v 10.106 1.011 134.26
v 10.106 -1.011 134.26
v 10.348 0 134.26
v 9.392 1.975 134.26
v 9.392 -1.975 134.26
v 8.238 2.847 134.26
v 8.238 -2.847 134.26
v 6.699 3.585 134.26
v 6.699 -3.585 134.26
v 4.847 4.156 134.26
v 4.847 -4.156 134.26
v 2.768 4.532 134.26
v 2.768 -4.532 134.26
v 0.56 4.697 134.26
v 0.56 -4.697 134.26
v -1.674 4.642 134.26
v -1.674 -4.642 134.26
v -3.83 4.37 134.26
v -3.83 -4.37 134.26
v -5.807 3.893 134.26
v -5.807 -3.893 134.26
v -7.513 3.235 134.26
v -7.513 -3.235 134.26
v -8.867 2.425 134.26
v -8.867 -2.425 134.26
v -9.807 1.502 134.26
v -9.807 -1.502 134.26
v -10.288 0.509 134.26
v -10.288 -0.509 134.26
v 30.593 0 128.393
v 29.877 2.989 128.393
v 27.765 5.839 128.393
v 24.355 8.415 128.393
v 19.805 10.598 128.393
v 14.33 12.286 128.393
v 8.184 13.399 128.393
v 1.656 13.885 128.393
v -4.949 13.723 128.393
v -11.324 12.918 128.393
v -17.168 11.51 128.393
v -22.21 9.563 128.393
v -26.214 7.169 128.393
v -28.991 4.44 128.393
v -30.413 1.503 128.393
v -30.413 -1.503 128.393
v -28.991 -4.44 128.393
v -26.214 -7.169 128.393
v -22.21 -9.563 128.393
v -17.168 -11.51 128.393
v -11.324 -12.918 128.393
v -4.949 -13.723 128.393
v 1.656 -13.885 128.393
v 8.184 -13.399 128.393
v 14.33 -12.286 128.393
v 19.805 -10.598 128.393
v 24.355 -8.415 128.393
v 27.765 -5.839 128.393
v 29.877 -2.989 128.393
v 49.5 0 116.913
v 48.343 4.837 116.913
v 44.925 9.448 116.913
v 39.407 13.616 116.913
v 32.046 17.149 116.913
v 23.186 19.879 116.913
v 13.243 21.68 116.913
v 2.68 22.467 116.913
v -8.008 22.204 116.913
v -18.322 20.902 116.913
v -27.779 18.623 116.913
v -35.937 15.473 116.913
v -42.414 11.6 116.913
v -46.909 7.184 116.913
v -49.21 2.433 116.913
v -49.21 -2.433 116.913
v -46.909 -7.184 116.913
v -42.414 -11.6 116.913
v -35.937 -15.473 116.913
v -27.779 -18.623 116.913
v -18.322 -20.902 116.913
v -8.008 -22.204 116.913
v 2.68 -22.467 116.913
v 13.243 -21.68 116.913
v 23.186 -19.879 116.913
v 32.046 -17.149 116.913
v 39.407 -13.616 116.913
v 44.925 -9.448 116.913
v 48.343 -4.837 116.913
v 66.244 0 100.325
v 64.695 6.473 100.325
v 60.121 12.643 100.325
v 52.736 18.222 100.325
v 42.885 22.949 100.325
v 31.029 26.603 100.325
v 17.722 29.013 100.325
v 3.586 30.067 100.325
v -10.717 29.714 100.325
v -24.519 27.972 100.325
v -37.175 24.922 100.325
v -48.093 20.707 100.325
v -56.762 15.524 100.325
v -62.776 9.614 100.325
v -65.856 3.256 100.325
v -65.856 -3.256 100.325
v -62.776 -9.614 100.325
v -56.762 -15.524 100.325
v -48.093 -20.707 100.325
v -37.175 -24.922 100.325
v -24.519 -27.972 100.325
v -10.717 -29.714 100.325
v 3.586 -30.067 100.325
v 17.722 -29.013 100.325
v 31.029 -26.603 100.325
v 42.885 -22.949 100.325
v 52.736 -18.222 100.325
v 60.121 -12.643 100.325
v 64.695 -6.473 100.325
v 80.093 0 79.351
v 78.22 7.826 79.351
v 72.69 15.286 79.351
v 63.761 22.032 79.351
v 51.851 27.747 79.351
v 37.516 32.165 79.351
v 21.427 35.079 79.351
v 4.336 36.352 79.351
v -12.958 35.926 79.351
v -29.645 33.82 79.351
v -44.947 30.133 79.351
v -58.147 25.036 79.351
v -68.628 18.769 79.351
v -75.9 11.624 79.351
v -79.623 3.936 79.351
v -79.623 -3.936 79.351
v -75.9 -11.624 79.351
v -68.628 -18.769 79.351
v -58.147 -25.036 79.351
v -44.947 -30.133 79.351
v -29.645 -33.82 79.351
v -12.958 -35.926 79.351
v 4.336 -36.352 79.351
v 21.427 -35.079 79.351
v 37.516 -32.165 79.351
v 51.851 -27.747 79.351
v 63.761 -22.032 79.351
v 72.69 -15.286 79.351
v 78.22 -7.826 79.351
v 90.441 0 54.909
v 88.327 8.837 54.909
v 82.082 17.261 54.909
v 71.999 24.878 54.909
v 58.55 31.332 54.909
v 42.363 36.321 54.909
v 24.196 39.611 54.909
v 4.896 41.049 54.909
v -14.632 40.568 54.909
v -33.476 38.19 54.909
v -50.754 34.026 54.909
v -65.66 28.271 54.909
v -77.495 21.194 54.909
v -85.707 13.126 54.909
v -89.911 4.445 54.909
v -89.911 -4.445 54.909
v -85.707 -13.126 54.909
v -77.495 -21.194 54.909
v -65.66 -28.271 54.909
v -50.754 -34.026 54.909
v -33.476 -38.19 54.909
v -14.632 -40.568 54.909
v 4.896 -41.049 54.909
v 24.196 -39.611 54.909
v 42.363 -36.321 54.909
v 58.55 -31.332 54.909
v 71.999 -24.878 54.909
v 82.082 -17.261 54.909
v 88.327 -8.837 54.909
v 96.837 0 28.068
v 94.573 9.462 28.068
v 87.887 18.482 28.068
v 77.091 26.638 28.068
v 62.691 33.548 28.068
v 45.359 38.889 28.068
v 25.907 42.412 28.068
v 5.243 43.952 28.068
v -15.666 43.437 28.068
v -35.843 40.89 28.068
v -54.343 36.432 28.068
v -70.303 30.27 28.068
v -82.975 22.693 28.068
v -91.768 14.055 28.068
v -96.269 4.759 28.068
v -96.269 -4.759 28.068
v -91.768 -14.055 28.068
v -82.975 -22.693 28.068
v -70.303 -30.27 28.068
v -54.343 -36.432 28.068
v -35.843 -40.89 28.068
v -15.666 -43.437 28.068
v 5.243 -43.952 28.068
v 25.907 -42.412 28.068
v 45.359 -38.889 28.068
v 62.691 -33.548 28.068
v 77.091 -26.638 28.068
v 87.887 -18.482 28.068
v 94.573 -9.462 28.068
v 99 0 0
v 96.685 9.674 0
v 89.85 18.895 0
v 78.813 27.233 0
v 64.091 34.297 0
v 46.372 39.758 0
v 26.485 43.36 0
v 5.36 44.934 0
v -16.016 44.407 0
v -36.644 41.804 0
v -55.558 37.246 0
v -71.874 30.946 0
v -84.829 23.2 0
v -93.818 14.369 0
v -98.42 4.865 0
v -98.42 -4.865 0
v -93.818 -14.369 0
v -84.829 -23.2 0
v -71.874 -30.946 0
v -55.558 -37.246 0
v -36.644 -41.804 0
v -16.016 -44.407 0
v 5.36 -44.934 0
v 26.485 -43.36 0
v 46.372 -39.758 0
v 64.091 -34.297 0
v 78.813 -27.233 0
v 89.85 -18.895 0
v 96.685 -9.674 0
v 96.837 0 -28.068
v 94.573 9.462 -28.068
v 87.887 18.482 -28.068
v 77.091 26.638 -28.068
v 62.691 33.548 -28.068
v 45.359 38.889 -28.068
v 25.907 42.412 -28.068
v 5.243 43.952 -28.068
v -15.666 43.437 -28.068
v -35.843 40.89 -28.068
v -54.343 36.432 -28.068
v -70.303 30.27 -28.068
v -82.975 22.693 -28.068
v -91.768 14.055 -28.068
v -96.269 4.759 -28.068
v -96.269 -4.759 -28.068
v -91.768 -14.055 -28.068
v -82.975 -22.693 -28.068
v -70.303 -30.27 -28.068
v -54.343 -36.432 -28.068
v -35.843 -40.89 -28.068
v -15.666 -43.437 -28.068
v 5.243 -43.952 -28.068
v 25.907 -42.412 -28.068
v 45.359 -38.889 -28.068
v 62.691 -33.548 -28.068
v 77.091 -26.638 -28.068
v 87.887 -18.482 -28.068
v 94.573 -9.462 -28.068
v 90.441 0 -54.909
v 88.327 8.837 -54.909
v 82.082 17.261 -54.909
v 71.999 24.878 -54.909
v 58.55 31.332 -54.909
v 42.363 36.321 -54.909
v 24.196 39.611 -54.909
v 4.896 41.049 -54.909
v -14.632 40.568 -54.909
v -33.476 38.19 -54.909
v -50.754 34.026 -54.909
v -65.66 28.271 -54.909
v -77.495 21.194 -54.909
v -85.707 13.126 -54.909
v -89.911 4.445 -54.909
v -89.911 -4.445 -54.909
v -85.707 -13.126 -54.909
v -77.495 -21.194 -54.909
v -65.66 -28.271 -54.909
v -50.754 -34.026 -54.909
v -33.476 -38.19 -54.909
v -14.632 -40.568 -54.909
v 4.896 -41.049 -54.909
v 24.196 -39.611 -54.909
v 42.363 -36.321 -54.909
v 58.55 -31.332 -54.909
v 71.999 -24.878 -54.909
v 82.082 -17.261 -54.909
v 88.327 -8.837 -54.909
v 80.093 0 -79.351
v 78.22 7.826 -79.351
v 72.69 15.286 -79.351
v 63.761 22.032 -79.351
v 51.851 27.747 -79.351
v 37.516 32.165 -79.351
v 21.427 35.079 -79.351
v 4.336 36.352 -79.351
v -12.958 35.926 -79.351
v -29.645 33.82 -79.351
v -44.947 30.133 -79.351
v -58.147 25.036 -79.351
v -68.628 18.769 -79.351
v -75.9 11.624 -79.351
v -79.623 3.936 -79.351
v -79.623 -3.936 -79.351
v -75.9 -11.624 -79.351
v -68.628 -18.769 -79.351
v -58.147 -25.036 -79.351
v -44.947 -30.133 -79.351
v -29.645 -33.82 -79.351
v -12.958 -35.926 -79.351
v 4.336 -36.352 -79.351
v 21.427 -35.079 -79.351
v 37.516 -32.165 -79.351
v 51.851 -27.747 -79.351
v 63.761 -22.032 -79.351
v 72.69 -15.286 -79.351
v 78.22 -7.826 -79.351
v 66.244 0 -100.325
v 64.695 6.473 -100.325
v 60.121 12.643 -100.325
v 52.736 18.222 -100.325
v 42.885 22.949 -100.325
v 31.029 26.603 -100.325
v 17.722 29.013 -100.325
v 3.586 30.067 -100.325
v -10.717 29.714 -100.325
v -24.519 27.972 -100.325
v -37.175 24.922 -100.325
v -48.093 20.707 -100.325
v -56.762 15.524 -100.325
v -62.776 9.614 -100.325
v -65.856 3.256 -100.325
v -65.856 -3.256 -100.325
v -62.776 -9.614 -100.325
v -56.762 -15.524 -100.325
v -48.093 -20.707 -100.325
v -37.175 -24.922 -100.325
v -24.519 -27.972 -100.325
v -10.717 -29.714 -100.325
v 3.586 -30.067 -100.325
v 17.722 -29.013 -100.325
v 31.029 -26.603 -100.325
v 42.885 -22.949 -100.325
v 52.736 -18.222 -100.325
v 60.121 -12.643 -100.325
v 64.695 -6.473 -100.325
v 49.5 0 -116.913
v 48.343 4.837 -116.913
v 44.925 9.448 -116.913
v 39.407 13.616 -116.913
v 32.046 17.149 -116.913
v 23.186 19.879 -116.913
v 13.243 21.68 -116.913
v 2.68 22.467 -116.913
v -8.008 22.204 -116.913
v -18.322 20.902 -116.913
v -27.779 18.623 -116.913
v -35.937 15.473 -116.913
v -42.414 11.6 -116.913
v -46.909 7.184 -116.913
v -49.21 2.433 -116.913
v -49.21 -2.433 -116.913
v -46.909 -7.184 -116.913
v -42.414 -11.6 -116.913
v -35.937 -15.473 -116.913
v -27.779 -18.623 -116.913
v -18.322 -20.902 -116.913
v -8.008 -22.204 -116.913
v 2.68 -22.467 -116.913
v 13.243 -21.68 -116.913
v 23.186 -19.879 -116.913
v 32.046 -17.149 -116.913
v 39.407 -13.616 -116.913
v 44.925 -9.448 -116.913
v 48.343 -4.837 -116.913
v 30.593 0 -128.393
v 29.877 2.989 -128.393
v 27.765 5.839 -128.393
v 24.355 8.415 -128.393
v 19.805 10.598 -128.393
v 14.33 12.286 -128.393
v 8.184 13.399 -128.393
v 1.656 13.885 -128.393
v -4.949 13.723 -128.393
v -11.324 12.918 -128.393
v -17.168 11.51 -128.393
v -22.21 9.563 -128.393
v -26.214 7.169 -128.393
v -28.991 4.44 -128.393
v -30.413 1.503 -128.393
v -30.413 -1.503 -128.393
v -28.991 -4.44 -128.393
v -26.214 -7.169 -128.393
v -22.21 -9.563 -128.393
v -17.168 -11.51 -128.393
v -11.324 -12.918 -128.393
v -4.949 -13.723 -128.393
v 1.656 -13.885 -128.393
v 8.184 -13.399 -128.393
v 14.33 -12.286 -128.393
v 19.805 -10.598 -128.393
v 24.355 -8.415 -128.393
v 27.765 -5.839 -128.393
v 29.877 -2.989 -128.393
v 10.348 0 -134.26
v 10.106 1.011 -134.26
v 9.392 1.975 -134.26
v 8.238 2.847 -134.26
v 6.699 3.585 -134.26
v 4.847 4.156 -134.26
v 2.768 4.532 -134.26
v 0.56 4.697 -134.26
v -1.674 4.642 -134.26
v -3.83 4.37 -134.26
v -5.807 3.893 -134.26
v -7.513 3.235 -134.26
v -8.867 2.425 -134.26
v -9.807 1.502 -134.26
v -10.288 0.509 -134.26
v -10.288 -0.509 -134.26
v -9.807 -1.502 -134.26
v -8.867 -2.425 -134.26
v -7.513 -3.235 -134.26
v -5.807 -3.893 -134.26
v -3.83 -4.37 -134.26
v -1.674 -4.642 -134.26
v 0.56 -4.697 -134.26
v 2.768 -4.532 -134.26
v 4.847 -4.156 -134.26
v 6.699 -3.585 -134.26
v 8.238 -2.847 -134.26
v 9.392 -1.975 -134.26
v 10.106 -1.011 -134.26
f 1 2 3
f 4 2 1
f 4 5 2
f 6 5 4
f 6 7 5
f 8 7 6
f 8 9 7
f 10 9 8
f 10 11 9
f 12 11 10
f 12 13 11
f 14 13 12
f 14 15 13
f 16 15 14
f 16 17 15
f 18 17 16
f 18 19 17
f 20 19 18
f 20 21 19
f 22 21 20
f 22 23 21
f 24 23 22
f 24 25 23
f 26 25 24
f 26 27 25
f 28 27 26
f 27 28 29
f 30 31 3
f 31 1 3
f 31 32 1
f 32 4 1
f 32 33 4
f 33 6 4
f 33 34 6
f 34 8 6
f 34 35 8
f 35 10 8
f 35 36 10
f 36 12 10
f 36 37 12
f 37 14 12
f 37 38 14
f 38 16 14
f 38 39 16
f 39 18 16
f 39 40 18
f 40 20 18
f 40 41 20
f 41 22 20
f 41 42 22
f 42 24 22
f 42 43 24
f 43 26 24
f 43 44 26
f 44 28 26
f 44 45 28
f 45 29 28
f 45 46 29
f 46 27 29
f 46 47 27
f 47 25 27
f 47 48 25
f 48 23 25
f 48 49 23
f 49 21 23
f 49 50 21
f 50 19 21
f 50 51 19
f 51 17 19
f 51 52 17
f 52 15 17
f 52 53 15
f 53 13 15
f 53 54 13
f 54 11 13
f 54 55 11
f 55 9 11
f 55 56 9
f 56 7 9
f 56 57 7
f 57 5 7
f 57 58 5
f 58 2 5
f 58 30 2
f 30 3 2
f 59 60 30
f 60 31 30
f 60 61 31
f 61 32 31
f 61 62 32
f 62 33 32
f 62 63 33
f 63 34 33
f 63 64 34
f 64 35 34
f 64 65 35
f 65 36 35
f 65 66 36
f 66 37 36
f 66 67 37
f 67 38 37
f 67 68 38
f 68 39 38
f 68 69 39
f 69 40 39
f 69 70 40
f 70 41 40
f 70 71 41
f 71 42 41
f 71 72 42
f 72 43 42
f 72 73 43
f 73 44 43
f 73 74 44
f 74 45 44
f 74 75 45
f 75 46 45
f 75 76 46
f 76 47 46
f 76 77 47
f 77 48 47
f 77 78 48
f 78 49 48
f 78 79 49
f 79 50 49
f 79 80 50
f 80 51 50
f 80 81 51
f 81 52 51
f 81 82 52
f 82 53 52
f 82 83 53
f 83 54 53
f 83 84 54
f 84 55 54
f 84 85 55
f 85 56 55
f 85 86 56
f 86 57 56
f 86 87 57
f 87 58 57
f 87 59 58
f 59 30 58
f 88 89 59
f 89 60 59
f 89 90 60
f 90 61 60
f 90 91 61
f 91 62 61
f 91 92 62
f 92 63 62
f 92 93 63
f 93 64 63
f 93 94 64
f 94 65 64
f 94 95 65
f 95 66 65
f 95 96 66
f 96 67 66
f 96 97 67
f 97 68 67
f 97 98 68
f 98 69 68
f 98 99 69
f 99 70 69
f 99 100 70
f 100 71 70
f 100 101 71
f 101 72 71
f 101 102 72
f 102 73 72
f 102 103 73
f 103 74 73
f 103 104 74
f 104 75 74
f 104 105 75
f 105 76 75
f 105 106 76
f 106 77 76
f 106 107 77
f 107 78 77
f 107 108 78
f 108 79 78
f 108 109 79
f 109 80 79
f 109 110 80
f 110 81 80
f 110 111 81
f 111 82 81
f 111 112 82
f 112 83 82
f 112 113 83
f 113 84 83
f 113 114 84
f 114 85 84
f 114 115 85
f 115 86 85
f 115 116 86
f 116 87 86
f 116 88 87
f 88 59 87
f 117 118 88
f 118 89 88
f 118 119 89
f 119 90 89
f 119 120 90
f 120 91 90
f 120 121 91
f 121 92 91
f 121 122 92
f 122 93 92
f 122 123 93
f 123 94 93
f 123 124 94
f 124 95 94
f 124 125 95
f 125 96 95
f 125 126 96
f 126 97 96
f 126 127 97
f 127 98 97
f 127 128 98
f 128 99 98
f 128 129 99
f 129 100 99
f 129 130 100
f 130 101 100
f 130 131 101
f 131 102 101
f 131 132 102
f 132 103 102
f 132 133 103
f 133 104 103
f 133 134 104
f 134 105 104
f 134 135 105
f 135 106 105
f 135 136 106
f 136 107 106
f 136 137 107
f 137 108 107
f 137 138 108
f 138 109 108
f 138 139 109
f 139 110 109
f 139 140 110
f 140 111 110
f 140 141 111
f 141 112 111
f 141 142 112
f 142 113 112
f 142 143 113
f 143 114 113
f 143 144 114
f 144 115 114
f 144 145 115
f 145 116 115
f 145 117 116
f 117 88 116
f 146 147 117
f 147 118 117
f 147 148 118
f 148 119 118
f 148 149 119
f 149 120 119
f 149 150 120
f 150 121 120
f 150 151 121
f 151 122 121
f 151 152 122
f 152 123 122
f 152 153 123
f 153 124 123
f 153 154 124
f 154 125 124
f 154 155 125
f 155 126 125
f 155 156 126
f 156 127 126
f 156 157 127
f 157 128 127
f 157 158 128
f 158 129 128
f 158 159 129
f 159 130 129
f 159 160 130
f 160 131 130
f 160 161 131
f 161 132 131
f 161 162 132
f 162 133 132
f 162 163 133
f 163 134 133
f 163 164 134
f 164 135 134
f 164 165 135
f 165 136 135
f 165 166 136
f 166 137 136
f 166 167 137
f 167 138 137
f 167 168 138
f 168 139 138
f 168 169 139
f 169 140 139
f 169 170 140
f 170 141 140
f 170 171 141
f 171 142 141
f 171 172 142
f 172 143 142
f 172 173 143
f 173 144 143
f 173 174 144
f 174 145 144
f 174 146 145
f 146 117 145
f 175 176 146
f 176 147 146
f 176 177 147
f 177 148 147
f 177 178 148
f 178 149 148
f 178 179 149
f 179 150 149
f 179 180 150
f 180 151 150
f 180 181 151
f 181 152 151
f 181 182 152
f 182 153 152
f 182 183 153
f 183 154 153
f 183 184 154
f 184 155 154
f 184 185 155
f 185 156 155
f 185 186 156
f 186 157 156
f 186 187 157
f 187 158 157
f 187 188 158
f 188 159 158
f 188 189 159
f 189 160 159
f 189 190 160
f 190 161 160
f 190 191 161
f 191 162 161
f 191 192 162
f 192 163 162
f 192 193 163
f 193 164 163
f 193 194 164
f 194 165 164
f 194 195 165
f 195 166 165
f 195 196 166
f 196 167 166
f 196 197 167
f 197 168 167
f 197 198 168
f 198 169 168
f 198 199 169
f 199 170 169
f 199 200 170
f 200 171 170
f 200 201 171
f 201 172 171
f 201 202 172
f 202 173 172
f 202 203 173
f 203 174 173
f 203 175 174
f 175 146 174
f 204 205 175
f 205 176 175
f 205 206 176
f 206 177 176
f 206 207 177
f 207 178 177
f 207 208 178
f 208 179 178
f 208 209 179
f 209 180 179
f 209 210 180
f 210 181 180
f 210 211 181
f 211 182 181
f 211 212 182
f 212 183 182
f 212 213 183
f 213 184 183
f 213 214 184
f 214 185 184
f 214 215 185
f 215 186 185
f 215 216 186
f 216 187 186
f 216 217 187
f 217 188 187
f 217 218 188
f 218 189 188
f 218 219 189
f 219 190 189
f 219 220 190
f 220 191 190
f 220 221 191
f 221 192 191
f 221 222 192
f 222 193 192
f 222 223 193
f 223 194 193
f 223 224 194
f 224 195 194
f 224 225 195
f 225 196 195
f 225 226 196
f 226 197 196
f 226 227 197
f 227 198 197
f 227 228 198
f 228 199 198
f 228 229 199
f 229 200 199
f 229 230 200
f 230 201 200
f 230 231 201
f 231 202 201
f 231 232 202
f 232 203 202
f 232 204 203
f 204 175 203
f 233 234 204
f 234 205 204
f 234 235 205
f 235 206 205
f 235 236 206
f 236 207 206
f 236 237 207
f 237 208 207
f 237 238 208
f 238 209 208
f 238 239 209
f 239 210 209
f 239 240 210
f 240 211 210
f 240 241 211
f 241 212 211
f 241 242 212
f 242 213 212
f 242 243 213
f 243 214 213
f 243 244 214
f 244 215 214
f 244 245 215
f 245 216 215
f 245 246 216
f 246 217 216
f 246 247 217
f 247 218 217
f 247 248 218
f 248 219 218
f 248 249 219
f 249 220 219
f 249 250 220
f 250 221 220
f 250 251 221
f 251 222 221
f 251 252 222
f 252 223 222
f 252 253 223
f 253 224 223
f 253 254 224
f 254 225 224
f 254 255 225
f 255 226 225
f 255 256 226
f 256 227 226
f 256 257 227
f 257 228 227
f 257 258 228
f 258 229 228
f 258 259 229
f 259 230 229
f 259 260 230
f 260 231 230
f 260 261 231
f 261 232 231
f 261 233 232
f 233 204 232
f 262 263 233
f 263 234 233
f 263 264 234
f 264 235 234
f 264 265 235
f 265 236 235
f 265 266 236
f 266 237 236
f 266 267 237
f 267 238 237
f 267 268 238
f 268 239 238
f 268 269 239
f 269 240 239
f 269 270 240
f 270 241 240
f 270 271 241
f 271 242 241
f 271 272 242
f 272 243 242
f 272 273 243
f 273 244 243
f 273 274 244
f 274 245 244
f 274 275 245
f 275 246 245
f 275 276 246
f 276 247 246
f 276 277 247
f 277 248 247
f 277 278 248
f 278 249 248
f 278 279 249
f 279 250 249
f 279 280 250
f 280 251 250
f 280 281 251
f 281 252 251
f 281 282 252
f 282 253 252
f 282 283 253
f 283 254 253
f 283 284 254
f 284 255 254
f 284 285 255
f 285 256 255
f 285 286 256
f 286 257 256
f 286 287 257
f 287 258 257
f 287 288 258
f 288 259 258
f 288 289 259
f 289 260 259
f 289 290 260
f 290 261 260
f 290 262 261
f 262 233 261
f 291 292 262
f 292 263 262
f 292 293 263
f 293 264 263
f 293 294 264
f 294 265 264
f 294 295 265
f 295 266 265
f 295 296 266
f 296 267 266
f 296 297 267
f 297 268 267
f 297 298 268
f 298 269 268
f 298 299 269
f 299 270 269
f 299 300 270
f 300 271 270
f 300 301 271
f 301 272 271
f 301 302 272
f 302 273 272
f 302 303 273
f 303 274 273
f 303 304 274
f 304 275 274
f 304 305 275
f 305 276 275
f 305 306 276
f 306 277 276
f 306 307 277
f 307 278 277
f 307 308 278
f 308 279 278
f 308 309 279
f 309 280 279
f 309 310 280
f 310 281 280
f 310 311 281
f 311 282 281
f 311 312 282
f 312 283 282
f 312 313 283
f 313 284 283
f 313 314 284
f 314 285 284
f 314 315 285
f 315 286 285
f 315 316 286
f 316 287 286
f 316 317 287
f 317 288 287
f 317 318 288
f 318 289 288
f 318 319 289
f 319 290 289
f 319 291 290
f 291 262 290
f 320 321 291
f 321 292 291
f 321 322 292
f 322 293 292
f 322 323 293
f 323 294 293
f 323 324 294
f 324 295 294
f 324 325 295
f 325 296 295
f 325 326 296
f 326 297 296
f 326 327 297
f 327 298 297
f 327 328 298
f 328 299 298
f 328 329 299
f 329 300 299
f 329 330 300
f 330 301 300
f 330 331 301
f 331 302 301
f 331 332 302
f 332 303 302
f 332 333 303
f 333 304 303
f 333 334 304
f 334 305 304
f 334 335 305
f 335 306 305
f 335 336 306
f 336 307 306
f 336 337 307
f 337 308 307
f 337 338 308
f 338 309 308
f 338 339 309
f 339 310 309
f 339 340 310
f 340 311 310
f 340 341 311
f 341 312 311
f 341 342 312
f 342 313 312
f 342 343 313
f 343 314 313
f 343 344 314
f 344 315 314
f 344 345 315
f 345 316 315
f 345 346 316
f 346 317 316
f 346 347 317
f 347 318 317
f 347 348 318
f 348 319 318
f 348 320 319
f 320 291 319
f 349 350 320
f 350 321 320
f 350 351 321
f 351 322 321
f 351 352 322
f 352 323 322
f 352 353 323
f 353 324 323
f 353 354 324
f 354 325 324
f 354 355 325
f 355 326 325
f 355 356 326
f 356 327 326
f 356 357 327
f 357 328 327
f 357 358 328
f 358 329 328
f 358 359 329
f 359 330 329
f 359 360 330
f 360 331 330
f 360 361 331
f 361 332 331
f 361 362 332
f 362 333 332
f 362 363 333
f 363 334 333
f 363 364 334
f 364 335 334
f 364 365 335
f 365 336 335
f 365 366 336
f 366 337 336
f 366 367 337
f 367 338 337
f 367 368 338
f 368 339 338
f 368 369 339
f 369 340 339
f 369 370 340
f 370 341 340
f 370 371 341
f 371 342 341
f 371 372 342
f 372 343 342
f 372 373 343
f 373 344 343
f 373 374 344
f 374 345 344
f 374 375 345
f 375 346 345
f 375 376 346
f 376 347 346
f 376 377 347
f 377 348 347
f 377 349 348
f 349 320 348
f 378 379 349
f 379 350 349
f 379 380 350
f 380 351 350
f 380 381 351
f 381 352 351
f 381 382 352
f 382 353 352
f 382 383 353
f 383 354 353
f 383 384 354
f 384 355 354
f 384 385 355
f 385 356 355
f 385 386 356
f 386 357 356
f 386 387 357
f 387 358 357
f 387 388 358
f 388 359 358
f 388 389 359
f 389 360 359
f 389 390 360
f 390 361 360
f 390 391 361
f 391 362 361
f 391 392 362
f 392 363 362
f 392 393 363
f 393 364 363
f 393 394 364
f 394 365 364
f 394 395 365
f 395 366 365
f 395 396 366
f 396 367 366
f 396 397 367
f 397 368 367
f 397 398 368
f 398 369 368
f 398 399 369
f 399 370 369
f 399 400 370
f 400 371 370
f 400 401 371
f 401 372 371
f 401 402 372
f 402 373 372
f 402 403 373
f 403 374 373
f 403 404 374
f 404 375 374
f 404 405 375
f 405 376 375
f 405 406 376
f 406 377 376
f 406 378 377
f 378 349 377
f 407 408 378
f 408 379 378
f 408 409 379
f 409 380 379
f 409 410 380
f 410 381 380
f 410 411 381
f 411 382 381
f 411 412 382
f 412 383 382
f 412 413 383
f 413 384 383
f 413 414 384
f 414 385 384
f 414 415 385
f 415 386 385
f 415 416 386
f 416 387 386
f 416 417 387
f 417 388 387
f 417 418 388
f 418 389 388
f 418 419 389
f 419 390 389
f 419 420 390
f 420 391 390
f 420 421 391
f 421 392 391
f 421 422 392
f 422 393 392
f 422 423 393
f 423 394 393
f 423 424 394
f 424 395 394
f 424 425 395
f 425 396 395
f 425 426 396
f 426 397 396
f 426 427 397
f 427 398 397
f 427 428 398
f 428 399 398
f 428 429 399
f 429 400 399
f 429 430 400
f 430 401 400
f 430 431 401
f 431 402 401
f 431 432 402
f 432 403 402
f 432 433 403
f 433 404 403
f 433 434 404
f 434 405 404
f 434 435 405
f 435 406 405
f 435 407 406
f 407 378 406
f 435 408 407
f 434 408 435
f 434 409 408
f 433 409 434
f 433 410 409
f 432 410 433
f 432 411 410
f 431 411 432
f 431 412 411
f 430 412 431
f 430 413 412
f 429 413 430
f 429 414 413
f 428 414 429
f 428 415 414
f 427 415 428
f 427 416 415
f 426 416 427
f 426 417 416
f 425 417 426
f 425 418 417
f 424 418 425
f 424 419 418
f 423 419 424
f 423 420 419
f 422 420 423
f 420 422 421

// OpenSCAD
// Generated by SolidPython 1.0.1 on 2020-07-29 00:46:49


scale(v = [11, 5, 15]) {
	sphere(r = 9);
}
/***********************************************
*********      SolidPython code:      **********
************************************************
 
# import packages: SolidPython
from solid import *
from solid.utils import *
from itertools import chain, combinations, permutations


class Resize:

    def __init__(self, scad_file):
        self.scad_file = scad_file
        #self.scad_file = import_scad(scad_file)
        # cone/cylinder param:
        self.r1 = 0
        self.r2 = 0
        self.h = 0
        # rectangular prism param:
        self.w = 0
        self.l = 0
        # ellipse param:
        self.r = 0

    # import OpenScad code (file name corresponds to shape)


    # classify shape + parameters
    def assign(self, param1, param2, param3):
        if self.scad_file == 'cone.scad':
            self.r1 = param1
            self.r2 = param2
            self.h = param3
        elif self.scad_file == 'cylinder.scad':
            self.r1 = param1
            self.r2 = param2
            self.h = param3
        elif self.scad_file == 'rectangularPrism.scad':
            self.h = param1
            self.l = param2
            self.w = param3
        else:
            self.r = param1
            self.h = param2

    # resize parameters
    def iterate(self):
        x = range(3, 20, 2)
        i = 1
        if self.scad_file == 'cone.scad':
            tempList = list(permutations(x, 2))
            for temp in tempList:
                param1 = temp[0]
                param2 = temp[1]
                filepath = 'produced_scad_files/' + 'cone' + str(param1) + '_' + str(param2) + '_' + '.scad'
                scad_render_to_file(cylinder(h=param1, r1=param2, r2=0), filepath)

        elif self.scad_file == 'cylinder.scad':
            tempList = list(permutations(x, 3))
            for temp in tempList:
                param1 = temp[0]
                param2 = temp[1]
                filepath = 'produced_scad_files/' + 'cylinder' + str(param1) + '_' + str(param2) + '_' + '.scad'
                scad_render_to_file(cylinder(h=param1, r1=param2, r2=param2), filepath)

        elif self.scad_file == 'rectangularPrism.scad':
            tempList = list(permutations(x, 3))
            for temp in tempList:
                param1 = temp[0]
                param2 = temp[1]
                param3 = temp[2]
                filepath = 'produced_scad_files/' + 'rectangularPrism' + str(param1) + '_' + str(param2) + '_' + str(
                    param3) + '.scad'
                scad_render_to_file(cube(size=(param1, param2, param3)), filepath)

        elif self.scad_file == 'ellipse.scad':
            tempList = list(permutations(x, 4))
            for temp in tempList:
                param1 = temp[0]
                param2 = temp[1]
                param3 = temp[2]
                param4 = temp[3]
                filepath = 'produced_scad_files/' + 'ellipse' + str(param1) + '_' + str(param2) + '_' + str(param3) + '_' + str(param4) + '.scad'
                scad_render_to_file(scale([param1, param2, param3])(sphere(r=param4)), filepath)

    def render_to_scadfile(self):
        scad_render_to_file(scad, 'example.scad') 
 
************************************************/
